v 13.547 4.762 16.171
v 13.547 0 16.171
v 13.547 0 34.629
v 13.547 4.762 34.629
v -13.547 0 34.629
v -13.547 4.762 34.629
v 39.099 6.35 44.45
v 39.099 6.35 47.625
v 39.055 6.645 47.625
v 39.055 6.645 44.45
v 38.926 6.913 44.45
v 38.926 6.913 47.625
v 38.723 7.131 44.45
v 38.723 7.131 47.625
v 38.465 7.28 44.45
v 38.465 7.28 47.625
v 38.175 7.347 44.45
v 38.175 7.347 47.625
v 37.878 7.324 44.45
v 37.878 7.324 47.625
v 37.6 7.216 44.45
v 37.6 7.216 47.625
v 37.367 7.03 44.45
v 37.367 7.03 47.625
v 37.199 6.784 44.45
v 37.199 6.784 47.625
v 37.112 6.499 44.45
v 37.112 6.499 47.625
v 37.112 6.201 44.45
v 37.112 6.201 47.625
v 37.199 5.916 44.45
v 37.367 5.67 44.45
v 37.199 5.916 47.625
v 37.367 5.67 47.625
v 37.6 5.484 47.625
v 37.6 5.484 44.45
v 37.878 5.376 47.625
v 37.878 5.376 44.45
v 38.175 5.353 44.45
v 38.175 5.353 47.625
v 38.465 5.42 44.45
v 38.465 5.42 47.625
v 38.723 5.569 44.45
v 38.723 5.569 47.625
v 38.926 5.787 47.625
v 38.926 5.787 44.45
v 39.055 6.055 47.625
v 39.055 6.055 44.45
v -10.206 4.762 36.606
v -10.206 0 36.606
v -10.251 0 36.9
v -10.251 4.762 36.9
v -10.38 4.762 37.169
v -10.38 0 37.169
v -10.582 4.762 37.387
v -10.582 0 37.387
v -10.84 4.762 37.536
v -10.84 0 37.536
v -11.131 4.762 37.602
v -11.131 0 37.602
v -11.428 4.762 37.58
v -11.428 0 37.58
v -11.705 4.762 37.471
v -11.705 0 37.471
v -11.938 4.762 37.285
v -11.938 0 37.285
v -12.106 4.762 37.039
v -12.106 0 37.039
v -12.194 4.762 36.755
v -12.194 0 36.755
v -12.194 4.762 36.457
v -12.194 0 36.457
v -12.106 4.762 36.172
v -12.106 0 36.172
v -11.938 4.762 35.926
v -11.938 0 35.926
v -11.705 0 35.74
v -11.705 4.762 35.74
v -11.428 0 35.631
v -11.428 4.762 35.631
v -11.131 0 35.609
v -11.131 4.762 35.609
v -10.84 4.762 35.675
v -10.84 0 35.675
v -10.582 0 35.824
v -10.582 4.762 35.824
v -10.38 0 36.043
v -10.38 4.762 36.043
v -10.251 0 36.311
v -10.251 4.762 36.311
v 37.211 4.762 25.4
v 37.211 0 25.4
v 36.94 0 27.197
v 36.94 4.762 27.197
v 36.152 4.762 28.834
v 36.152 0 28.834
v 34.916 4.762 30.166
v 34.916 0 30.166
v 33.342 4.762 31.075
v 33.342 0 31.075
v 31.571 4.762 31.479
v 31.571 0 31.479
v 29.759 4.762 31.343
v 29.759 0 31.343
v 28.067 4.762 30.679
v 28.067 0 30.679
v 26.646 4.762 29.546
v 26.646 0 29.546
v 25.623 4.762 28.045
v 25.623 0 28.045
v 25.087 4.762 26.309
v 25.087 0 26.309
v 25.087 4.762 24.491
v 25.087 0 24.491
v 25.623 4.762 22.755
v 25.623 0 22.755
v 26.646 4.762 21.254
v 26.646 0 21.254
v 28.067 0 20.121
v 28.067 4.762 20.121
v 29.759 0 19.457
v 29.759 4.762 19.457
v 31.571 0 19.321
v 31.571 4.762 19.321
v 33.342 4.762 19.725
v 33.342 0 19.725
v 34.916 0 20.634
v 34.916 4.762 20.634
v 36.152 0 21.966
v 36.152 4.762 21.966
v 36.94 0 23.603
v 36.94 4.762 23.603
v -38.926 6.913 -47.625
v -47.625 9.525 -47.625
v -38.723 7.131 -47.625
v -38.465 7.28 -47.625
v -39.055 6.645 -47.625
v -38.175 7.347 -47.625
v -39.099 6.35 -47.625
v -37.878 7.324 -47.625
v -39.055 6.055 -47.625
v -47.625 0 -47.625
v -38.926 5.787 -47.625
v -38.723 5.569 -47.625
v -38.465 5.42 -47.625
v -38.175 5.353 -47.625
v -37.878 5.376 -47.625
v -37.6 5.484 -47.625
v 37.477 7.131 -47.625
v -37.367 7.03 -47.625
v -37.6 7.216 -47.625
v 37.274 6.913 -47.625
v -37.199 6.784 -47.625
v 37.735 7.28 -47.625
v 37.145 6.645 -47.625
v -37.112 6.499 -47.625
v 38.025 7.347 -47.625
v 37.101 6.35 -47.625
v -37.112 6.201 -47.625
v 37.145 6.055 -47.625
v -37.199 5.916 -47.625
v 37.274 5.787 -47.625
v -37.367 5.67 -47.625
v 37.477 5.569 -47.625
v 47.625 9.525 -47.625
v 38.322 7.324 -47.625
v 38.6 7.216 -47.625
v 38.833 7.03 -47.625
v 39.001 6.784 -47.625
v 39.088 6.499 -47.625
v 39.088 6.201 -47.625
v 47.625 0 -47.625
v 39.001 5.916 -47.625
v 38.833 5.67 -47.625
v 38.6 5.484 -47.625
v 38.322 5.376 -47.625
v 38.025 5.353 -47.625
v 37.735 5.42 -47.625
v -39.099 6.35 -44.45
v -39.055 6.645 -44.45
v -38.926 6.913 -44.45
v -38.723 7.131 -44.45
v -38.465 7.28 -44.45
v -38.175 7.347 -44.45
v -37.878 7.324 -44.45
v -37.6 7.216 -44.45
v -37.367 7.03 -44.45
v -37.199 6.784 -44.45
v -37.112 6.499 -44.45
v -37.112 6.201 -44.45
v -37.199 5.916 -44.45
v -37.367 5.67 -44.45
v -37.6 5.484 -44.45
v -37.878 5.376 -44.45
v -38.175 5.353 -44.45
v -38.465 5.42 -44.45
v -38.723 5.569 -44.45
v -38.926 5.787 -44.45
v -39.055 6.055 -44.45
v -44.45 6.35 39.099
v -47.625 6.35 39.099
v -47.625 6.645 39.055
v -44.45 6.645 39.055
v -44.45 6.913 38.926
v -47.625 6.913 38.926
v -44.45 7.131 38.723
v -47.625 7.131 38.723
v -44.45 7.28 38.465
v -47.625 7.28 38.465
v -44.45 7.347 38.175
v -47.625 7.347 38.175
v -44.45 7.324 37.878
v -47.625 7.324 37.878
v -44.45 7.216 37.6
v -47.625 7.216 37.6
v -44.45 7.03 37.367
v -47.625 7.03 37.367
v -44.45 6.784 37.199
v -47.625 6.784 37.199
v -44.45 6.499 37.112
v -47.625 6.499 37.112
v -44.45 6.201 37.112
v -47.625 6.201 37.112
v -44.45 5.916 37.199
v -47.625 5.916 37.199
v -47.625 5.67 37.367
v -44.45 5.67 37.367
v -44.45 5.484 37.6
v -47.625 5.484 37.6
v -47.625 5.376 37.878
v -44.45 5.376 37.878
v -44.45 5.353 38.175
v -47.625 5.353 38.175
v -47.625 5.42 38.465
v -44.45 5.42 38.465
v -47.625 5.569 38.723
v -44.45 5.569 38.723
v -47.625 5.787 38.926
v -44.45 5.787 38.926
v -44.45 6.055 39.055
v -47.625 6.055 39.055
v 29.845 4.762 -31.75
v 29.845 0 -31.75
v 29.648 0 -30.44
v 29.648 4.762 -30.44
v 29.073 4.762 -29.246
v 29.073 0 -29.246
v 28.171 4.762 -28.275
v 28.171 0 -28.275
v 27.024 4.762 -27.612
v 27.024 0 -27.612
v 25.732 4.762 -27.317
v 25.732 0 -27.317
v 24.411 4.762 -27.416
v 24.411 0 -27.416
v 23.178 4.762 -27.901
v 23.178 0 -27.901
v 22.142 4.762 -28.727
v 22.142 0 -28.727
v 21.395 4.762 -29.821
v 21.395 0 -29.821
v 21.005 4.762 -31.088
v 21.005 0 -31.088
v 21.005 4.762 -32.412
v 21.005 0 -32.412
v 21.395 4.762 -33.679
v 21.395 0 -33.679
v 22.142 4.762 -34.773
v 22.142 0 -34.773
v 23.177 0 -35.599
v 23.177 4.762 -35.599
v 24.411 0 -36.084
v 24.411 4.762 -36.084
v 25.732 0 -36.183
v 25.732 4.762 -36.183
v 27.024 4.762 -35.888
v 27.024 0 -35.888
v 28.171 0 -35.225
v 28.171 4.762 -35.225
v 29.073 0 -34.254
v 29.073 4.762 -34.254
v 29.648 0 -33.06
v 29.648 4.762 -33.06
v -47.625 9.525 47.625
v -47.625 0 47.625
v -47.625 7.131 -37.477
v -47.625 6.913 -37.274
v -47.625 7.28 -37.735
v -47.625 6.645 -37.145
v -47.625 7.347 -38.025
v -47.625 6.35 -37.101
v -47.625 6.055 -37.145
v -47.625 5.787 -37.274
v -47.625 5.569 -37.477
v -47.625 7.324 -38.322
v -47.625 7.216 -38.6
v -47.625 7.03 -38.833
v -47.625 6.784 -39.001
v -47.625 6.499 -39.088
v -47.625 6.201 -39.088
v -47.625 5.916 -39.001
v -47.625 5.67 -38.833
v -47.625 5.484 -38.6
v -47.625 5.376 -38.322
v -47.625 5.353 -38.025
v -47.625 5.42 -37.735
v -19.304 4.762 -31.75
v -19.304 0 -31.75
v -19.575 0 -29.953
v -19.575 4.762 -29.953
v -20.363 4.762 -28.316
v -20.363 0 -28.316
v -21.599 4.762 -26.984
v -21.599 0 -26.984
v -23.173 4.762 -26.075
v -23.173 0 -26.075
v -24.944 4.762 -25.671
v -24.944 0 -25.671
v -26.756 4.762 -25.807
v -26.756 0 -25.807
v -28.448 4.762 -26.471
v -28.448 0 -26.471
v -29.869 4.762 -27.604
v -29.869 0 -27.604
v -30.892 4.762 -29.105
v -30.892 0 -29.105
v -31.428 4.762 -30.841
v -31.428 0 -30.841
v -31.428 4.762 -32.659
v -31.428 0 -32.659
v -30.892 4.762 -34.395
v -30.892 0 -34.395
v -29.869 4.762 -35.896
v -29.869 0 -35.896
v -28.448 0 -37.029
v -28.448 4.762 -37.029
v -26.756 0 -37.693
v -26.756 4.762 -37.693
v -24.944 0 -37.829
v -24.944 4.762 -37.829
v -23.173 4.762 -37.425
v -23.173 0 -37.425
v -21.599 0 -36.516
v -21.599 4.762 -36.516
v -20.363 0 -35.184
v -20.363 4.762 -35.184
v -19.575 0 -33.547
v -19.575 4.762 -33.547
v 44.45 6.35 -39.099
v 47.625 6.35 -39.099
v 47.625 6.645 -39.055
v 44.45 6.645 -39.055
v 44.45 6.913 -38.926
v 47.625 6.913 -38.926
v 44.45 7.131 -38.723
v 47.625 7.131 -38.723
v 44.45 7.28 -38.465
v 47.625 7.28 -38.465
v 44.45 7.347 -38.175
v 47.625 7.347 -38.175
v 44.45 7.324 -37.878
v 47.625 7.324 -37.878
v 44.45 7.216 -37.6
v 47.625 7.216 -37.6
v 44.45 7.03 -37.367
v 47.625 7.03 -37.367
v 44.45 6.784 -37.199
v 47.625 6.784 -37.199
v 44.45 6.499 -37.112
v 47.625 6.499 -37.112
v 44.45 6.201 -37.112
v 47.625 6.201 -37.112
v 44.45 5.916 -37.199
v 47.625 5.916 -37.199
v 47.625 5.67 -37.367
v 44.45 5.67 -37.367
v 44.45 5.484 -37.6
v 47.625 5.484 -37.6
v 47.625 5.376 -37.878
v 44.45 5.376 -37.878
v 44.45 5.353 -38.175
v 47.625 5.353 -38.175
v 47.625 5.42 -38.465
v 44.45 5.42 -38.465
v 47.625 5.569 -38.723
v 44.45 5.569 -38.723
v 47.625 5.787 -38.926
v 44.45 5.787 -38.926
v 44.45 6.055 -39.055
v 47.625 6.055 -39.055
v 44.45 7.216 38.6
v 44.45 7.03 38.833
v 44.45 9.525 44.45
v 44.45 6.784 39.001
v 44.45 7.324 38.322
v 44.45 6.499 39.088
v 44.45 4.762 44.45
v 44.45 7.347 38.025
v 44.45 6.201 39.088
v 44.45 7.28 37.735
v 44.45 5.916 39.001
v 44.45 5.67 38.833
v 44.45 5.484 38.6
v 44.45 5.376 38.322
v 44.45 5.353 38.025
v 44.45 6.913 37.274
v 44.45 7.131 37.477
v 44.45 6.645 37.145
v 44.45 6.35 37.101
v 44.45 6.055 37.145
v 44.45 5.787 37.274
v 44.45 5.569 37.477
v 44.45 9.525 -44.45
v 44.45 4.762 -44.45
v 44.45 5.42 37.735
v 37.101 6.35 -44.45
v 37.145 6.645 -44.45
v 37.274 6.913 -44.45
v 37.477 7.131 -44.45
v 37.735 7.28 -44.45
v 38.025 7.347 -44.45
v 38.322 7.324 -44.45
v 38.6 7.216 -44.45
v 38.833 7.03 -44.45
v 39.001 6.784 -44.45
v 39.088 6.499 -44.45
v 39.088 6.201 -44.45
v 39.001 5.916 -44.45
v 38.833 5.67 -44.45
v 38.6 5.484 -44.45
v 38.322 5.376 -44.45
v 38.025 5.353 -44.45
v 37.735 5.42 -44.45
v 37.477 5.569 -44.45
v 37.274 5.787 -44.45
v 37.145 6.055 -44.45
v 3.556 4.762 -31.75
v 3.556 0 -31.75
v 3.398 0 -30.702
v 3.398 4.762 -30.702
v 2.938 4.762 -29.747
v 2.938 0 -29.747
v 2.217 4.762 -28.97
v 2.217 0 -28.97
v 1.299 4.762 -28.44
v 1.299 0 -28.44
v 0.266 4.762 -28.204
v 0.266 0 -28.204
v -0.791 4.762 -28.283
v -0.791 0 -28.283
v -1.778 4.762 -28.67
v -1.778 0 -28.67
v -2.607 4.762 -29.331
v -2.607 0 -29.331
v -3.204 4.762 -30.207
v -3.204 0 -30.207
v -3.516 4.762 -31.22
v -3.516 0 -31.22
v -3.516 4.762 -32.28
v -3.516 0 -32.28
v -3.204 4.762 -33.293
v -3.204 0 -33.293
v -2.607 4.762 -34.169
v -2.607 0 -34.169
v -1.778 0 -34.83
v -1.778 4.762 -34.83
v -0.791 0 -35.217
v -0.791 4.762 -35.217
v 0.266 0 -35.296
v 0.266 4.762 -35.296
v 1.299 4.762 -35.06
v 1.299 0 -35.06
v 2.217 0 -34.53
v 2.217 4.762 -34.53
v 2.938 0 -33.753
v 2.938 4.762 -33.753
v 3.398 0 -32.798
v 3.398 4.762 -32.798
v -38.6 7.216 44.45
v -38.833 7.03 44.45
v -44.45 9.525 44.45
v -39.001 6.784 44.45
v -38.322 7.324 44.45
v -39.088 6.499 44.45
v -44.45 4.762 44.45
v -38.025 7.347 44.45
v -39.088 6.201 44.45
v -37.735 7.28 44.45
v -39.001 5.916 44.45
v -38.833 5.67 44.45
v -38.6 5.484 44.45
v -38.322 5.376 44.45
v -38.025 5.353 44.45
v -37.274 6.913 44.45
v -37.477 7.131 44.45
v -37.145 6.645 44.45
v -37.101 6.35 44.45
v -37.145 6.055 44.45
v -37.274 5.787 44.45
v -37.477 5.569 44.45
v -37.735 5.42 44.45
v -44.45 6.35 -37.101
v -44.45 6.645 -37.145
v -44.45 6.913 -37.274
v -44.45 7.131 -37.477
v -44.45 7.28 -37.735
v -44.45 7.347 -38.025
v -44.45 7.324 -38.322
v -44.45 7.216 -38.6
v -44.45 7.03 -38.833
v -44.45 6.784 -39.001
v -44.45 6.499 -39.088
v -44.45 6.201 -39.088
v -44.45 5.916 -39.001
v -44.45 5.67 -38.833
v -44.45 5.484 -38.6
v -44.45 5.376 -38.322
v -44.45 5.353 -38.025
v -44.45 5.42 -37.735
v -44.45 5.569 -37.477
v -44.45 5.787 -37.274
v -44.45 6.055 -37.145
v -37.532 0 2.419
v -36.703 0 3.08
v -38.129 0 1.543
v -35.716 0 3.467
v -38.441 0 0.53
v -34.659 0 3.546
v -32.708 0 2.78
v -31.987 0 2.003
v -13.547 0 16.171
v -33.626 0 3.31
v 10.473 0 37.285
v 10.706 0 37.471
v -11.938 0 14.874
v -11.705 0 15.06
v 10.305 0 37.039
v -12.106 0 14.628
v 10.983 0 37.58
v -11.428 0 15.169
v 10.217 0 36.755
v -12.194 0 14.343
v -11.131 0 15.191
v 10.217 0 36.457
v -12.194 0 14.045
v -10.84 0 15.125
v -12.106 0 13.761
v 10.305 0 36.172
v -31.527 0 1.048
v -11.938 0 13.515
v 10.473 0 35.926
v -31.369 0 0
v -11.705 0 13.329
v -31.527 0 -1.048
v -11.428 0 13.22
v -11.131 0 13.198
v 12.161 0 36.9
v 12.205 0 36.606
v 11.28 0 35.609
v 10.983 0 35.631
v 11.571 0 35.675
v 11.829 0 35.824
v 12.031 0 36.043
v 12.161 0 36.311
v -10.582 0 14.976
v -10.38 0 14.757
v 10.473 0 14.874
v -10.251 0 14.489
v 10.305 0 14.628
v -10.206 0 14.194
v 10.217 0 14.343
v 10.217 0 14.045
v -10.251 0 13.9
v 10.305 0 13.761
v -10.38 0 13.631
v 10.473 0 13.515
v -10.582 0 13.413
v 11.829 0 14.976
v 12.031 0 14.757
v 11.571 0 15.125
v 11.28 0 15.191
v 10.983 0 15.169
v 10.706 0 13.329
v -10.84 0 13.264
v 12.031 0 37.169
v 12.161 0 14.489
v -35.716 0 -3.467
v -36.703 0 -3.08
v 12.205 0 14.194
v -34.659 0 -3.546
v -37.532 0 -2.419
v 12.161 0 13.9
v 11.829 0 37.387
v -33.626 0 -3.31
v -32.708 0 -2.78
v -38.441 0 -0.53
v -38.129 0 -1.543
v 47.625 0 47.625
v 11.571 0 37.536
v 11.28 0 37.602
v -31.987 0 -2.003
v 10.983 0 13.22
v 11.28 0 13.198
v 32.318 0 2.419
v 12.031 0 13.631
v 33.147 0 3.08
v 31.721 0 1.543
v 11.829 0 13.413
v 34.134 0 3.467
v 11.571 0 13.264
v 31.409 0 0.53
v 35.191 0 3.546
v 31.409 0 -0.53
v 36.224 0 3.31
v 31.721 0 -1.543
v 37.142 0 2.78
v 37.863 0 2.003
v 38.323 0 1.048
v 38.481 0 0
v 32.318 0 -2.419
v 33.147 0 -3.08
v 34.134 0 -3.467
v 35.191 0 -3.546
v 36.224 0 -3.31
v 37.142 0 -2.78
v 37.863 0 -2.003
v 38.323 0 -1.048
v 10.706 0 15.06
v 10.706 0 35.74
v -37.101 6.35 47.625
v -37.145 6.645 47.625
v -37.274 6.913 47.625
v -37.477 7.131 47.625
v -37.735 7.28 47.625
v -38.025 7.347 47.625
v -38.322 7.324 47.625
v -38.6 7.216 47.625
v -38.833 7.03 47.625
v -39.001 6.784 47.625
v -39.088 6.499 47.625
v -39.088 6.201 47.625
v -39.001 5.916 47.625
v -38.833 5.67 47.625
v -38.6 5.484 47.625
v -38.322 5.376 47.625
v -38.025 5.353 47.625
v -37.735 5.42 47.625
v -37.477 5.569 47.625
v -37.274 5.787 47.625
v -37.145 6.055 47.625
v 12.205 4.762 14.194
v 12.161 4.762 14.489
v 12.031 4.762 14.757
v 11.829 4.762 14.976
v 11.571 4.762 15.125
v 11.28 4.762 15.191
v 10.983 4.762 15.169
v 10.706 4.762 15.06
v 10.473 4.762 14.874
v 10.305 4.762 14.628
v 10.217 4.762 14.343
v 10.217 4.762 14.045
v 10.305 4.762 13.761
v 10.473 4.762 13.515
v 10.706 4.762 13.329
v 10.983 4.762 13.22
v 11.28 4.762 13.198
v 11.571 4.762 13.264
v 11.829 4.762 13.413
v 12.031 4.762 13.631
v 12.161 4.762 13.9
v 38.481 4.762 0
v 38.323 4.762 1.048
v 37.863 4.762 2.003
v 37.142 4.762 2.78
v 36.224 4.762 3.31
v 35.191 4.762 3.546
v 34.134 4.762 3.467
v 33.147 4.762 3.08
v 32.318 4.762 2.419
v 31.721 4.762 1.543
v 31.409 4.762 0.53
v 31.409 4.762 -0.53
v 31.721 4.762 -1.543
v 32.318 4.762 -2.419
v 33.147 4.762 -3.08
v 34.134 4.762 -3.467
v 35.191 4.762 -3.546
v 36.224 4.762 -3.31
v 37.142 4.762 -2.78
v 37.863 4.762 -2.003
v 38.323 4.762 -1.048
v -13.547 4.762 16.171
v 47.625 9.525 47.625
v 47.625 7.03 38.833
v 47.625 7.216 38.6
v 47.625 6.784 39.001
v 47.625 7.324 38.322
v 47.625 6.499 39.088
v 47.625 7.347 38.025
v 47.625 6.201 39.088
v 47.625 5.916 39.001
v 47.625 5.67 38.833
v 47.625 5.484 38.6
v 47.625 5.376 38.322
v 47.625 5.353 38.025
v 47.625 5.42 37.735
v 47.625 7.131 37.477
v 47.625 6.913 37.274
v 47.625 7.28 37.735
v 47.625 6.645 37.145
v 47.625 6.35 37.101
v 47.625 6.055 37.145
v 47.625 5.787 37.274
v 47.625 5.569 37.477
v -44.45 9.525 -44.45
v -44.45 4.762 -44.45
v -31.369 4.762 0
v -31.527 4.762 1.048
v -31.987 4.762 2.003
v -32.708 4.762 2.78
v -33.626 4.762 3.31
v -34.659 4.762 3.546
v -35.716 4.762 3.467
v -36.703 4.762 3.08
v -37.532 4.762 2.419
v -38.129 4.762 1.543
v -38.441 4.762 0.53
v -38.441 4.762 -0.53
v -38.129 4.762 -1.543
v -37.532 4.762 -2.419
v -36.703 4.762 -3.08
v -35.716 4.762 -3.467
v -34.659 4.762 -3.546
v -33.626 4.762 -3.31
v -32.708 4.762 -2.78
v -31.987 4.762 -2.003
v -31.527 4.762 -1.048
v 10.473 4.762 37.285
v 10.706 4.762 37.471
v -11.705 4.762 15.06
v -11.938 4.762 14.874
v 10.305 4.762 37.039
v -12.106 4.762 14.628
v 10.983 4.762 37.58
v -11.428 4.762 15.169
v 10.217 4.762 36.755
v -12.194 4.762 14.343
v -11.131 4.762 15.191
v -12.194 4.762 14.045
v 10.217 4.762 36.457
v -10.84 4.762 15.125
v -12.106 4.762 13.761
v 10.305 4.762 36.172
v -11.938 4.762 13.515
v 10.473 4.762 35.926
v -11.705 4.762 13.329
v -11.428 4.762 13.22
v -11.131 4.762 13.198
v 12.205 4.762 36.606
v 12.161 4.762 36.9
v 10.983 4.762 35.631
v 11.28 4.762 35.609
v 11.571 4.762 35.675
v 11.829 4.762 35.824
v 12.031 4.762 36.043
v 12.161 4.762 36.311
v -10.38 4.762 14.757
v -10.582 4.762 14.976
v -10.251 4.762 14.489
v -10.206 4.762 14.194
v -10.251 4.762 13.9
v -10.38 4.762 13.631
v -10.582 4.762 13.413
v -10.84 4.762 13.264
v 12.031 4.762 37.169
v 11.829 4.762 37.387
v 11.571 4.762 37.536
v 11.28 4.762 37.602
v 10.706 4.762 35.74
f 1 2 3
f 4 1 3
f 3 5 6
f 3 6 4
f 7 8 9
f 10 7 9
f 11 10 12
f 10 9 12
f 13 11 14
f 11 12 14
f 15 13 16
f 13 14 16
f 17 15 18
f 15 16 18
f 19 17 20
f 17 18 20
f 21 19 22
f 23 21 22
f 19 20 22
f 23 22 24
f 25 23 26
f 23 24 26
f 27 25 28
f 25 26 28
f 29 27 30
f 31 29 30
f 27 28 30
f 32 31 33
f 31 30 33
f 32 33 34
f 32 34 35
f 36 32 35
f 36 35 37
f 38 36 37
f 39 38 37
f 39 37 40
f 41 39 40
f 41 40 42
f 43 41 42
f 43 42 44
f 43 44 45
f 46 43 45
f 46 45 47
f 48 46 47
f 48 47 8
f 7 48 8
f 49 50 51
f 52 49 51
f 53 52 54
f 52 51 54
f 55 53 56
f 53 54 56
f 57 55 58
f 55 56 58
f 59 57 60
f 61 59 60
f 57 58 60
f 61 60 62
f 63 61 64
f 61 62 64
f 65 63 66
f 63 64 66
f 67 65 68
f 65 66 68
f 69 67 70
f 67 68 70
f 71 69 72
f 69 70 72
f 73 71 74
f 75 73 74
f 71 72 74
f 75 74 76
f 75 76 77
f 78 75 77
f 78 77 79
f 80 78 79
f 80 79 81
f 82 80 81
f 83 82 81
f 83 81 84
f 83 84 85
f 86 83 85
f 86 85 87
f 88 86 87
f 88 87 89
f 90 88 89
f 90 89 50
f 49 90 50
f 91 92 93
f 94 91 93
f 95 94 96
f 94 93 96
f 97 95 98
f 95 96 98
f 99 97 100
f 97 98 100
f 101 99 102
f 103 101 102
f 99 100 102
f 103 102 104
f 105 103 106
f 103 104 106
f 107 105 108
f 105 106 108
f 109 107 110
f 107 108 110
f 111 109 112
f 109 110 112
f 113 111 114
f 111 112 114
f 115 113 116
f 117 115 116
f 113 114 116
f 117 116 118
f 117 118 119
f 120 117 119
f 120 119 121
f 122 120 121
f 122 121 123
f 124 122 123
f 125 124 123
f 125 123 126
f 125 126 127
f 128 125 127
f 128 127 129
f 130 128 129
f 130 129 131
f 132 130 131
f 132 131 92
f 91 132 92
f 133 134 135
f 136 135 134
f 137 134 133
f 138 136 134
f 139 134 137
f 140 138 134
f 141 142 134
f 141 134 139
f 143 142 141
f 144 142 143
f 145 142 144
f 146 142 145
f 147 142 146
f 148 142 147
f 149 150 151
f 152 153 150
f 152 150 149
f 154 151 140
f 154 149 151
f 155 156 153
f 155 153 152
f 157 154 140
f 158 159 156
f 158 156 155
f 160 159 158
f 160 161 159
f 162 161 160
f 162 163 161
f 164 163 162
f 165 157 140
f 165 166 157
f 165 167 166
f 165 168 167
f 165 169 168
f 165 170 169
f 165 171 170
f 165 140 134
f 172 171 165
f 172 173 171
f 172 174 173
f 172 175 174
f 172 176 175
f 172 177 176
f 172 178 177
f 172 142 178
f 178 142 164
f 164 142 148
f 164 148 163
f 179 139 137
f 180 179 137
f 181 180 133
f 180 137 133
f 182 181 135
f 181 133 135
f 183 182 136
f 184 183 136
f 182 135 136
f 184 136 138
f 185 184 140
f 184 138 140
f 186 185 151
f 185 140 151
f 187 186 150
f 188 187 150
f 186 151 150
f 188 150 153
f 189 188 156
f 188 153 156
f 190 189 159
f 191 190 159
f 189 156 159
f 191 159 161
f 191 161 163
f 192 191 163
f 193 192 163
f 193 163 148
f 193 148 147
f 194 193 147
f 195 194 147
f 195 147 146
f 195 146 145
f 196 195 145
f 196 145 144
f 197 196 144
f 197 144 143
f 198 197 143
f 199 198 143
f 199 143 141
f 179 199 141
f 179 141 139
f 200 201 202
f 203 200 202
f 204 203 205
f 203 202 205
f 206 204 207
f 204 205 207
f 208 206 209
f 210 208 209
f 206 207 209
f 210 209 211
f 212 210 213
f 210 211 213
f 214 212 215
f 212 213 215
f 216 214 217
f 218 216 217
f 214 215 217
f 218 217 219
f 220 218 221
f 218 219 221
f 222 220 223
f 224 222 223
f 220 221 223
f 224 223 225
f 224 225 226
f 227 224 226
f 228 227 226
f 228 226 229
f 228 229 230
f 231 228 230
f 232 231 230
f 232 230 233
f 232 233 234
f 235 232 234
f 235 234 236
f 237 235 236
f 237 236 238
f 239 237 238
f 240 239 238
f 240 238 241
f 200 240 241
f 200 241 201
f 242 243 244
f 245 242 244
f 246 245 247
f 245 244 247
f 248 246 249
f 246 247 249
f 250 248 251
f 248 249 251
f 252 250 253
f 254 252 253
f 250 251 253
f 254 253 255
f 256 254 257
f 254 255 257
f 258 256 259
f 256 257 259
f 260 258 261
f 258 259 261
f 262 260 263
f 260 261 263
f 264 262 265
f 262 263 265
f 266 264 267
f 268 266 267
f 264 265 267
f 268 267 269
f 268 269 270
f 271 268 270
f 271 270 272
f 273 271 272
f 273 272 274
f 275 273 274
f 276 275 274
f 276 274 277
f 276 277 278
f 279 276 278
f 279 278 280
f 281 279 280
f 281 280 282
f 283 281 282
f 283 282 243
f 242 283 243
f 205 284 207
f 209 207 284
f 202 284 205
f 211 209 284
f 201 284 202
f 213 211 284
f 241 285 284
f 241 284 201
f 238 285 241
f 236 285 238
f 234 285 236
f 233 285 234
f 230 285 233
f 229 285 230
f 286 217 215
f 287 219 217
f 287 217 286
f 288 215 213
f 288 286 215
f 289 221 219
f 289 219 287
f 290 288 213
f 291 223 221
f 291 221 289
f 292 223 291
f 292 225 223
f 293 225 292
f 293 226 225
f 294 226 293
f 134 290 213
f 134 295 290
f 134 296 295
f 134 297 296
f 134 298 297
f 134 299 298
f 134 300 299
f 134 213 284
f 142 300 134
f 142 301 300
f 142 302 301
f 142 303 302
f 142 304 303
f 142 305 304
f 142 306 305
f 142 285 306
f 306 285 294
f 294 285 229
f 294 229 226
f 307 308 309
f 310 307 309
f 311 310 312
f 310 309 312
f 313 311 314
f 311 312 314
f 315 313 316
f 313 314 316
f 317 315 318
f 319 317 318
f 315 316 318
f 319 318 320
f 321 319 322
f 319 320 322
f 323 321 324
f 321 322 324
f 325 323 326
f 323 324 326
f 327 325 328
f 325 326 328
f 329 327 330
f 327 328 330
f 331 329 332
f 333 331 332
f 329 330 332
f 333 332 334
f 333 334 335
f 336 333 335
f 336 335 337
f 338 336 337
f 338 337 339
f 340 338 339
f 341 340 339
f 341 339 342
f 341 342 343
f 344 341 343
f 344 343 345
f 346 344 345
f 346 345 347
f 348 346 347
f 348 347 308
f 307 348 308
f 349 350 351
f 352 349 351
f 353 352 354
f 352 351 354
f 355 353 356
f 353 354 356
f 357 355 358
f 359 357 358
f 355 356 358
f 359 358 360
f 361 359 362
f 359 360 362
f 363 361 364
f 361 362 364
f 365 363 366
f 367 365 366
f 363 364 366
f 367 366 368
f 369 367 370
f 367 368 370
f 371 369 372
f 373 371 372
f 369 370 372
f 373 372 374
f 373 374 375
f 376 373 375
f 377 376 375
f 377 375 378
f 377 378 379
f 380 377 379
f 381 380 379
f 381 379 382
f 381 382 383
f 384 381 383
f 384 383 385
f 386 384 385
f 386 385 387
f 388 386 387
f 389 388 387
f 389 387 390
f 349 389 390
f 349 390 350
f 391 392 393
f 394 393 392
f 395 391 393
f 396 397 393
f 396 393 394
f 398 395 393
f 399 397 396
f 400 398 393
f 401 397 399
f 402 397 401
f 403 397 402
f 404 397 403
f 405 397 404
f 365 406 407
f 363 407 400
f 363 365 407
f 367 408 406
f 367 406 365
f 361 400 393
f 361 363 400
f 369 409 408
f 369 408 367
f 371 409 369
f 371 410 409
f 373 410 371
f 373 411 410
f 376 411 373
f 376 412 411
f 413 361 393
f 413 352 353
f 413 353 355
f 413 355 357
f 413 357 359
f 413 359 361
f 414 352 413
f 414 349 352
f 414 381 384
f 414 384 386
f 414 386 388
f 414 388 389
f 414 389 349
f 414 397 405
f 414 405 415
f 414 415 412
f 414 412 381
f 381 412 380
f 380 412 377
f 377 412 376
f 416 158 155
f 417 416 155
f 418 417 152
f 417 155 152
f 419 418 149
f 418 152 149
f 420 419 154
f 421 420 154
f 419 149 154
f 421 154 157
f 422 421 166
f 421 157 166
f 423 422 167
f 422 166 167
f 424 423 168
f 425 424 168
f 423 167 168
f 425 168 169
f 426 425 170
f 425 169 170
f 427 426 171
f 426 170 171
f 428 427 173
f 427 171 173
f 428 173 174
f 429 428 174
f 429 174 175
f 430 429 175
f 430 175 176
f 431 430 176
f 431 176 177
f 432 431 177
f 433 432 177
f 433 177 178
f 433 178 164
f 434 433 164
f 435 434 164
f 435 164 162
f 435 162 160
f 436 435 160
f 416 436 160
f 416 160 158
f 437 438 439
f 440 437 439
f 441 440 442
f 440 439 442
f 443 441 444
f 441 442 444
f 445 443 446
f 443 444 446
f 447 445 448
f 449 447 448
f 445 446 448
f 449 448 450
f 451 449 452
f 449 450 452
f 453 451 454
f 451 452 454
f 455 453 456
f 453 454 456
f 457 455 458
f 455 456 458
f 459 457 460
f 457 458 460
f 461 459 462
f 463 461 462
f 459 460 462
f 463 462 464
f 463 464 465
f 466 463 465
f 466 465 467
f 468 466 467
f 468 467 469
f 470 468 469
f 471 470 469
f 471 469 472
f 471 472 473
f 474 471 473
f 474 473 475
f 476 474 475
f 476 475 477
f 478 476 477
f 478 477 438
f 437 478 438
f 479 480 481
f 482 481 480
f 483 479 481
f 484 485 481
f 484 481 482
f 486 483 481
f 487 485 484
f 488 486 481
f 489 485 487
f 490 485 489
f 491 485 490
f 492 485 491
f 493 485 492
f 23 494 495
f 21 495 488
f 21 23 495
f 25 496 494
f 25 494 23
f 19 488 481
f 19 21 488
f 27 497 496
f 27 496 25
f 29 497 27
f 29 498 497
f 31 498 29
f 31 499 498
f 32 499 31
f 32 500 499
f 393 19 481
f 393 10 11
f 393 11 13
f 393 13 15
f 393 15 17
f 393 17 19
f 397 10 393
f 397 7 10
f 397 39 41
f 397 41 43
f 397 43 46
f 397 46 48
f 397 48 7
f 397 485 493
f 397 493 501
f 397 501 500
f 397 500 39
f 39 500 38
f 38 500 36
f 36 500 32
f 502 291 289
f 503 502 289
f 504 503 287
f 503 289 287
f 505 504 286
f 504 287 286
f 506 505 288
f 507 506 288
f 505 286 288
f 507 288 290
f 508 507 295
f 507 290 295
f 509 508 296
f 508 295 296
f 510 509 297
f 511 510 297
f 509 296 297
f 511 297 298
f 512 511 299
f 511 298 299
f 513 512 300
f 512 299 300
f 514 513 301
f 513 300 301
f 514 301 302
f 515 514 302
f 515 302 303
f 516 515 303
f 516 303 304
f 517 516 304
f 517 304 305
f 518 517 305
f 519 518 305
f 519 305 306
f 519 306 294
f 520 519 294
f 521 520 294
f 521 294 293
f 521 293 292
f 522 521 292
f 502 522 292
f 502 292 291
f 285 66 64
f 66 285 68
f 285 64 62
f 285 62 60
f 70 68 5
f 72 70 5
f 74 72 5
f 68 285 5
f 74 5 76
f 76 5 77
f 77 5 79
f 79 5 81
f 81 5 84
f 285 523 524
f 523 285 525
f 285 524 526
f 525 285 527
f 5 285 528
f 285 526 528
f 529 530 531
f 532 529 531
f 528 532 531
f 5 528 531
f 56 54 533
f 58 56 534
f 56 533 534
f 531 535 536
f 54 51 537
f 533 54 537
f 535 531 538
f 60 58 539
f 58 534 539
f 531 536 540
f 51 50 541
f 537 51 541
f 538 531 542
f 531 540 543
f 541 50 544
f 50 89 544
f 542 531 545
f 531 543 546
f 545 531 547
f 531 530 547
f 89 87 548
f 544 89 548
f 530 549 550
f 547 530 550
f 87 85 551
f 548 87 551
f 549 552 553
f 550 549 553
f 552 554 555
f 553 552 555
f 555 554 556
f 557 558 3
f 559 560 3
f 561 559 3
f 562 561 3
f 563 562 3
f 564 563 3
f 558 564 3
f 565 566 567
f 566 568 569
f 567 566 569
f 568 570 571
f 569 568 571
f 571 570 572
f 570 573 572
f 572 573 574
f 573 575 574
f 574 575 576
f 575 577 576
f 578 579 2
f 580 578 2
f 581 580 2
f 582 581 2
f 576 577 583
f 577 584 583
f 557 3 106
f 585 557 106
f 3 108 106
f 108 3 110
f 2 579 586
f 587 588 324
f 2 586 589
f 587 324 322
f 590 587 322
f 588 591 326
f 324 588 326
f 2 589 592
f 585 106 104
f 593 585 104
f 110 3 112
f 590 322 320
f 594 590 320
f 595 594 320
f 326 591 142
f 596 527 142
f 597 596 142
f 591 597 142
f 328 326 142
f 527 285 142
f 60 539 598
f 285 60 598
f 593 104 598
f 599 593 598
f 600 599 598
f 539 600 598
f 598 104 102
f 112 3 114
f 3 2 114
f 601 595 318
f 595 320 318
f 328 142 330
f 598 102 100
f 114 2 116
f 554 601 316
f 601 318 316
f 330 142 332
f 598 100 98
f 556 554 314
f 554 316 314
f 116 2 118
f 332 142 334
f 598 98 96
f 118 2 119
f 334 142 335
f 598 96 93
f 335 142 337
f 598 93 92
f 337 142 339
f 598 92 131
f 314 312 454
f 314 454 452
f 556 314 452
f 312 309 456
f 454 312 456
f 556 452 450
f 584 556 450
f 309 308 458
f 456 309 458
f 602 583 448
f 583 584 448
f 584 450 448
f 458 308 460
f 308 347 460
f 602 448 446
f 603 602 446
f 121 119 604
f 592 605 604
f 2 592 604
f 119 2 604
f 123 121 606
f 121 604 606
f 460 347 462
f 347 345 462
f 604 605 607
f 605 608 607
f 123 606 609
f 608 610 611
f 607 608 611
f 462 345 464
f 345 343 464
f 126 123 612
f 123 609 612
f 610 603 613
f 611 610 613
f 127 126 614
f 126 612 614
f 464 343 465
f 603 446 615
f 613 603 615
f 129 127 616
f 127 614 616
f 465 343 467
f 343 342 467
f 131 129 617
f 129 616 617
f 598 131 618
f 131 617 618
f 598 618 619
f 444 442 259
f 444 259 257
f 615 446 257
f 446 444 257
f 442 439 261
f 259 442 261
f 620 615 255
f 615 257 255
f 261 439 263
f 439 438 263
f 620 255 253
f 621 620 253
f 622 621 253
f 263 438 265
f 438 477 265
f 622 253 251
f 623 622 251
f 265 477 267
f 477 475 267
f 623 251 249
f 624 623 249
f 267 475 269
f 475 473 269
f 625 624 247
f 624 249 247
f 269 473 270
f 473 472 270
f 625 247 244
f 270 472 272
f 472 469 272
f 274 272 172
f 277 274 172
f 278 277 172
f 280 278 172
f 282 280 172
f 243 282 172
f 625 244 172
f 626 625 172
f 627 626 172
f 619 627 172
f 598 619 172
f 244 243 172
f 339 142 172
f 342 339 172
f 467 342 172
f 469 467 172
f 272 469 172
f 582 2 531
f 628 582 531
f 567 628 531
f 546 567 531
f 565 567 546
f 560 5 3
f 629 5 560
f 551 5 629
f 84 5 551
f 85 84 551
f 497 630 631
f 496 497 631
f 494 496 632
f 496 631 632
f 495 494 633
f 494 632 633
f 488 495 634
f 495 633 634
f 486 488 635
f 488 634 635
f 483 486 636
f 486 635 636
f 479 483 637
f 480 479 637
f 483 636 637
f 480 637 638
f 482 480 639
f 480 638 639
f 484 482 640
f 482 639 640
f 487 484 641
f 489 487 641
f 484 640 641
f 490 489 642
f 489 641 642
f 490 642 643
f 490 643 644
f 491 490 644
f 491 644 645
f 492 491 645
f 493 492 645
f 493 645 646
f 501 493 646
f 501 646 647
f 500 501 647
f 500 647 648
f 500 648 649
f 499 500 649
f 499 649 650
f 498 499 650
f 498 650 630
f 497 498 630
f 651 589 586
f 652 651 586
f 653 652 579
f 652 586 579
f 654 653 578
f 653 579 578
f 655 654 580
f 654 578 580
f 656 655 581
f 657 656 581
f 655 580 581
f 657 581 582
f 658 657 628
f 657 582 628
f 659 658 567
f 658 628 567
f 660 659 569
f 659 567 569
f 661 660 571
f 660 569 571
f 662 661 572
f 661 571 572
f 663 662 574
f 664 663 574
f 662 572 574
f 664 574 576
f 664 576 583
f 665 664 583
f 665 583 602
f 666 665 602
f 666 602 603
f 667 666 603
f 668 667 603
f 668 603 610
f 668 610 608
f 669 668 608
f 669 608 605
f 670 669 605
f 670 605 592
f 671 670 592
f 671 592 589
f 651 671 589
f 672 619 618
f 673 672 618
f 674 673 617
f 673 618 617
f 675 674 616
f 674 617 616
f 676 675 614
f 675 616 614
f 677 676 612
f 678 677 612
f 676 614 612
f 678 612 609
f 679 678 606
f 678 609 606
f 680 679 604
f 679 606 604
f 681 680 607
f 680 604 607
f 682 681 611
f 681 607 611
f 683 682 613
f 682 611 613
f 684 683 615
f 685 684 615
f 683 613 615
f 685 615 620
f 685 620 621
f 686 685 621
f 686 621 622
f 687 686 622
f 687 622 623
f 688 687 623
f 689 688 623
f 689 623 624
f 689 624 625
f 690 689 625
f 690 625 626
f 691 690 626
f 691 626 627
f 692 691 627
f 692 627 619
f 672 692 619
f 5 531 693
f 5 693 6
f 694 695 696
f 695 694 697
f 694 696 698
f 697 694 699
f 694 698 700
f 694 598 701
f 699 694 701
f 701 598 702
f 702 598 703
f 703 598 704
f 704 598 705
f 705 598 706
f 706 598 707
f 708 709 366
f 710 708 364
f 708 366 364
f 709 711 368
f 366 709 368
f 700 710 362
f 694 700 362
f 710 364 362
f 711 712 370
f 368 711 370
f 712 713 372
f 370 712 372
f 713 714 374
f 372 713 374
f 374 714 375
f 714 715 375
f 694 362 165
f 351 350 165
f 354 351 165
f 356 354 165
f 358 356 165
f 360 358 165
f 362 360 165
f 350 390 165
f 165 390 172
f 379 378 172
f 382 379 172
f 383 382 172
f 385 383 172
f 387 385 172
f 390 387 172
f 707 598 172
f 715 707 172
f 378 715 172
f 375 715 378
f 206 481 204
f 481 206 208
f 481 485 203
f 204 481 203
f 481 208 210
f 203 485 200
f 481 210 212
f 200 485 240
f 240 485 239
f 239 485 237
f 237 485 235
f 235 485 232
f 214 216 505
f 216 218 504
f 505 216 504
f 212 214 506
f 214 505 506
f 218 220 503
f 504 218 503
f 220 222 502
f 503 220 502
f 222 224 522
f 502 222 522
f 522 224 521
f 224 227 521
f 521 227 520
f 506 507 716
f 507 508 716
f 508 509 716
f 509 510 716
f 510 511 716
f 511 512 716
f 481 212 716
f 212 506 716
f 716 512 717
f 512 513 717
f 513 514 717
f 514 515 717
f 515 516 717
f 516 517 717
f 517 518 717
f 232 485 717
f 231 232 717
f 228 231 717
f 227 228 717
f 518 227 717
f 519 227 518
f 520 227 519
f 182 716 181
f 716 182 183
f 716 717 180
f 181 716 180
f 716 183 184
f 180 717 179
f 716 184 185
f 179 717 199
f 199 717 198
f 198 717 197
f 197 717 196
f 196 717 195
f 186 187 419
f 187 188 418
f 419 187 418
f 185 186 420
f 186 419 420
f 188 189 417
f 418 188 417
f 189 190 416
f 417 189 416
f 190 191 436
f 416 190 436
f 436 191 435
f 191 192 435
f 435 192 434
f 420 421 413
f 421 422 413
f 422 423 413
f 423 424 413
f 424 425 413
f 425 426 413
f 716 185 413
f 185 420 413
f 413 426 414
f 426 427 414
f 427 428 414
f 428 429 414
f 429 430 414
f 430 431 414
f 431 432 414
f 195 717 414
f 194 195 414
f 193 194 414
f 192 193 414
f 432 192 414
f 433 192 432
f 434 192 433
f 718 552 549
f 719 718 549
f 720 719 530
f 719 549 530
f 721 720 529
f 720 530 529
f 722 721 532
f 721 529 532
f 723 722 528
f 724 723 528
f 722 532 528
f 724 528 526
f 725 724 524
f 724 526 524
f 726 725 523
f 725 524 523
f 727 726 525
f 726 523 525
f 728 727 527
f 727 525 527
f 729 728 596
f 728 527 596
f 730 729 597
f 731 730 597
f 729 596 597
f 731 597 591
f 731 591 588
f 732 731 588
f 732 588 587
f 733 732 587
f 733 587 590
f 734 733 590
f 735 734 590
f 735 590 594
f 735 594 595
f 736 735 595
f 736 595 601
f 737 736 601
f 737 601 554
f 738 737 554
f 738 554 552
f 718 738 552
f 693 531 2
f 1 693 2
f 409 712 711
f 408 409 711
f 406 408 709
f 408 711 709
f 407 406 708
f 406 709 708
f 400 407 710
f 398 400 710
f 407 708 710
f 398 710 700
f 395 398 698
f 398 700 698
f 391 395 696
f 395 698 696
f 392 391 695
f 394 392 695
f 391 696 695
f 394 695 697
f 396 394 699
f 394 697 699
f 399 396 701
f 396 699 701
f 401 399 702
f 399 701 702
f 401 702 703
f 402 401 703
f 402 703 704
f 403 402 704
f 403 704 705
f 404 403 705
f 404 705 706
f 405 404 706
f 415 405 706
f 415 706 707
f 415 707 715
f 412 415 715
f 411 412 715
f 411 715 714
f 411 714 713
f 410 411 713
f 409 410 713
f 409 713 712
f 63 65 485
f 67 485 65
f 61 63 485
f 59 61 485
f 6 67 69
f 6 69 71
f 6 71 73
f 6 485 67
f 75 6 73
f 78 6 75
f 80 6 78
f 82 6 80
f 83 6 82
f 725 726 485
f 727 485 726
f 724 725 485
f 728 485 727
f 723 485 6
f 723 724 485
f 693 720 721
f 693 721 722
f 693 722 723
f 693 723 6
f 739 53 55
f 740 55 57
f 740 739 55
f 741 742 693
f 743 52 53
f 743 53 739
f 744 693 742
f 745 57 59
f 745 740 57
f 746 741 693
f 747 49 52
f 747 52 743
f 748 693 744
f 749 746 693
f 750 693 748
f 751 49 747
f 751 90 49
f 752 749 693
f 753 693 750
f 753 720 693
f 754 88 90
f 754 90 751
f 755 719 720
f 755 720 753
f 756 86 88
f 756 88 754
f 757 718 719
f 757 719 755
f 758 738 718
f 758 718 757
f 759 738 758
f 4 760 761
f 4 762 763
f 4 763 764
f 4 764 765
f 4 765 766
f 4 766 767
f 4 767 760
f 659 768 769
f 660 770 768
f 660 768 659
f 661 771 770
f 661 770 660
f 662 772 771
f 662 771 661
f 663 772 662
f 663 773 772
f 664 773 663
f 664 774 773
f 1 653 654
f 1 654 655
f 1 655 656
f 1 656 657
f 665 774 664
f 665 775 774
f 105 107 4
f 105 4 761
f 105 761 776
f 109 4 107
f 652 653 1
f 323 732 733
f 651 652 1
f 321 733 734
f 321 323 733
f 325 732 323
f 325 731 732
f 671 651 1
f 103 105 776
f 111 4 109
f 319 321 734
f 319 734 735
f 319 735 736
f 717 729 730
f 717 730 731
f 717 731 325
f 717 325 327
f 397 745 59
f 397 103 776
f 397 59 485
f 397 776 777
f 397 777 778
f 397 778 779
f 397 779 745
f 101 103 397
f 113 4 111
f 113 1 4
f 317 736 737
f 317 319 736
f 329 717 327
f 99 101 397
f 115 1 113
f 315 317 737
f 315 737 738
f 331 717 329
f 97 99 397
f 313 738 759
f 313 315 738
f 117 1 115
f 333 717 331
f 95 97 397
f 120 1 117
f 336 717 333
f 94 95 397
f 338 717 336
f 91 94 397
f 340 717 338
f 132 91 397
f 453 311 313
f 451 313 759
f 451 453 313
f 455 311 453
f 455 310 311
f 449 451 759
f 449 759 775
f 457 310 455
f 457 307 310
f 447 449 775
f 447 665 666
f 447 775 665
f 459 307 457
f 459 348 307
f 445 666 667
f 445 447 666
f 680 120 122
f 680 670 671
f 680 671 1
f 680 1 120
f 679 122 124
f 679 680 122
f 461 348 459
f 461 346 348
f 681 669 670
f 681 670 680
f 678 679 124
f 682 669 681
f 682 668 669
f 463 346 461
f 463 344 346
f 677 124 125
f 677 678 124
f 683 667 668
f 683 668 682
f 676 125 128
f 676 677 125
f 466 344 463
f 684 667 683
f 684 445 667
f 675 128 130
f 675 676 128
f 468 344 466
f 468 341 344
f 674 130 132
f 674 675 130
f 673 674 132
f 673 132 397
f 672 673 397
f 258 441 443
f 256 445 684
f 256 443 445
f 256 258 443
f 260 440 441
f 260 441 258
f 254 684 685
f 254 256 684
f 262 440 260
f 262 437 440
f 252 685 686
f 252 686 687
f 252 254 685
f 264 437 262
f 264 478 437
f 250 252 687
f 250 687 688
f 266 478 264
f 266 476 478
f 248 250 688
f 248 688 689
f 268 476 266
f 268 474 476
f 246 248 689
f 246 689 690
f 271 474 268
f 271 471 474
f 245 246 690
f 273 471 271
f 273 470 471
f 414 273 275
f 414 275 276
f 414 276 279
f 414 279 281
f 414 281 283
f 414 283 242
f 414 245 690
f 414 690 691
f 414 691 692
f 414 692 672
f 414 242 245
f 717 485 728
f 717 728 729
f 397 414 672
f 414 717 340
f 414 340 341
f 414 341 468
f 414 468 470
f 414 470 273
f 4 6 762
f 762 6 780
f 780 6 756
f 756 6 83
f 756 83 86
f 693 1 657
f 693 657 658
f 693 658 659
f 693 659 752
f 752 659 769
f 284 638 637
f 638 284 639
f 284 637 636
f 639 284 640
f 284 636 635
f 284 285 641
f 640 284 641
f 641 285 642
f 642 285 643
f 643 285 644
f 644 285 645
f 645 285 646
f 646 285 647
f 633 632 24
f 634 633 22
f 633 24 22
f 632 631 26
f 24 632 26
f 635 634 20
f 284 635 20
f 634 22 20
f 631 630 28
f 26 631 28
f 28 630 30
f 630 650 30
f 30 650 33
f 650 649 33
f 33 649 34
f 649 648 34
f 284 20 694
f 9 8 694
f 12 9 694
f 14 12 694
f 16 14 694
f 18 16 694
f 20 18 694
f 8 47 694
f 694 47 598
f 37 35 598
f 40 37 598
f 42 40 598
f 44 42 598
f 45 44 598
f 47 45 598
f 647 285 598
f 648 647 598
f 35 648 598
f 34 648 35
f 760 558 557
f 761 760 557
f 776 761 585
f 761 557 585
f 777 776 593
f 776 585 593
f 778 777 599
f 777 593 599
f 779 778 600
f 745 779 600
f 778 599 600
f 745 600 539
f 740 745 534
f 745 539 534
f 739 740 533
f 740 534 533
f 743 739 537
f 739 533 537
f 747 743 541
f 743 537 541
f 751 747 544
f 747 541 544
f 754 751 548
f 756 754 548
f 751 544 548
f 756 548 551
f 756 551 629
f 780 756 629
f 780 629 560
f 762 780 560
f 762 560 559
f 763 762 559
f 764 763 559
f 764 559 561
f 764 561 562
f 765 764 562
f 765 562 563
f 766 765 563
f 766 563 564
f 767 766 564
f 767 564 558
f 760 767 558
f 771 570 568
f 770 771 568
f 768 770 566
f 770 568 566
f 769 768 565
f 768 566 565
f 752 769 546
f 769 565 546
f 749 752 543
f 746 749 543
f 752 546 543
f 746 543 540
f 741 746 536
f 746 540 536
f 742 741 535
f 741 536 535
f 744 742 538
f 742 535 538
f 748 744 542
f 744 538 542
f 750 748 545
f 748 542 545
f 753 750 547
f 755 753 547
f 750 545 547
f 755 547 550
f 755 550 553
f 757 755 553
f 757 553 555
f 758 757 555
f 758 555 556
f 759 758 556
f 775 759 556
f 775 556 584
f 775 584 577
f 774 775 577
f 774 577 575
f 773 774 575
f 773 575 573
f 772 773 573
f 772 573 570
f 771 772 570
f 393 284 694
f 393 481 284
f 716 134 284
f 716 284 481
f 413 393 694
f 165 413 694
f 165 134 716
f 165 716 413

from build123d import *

# Parameters (mm, degrees)
SKETCH1_W           = 101.6
SKETCH1_H           = 101.6
BOSS_EXTRUDE1_DEPTH = 3.175
SKETCH2_W           = 101.6
SKETCH2_H           = 101.6
SKETCH2_W_2         = 88.9
SKETCH2_H_2         = 88.9
BOSS_EXTRUDE2_DEPTH = 6.35
SKETCH3_R           = 0.99949
CUT_EXTRUDE1_DEPTH  = 6.35
CIRPATTERN1_COUNT   = 4
SKETCH8_W           = 88.9
SKETCH8_H           = 88.9
BOSS_EXTRUDE3_DEPTH = 1.5875
SKETCH4_W           = 101.6
SKETCH4_H           = 101.6
SKETCH4_W_2         = 95.25
SKETCH4_H_2         = 95.25
CUT_EXTRUDE2_DEPTH  = 10.525
SKETCH6_R           = 3.556
SKETCH6_R_2         = 6.096
SKETCH6_R_3         = 4.445
INPUTS_DEPTH        = 10.525
SKETCH5_R           = 0.99949
SKETCH5_W           = 27.093418
SKETCH5_H           = 18.457418
SCREEN_DEPTH        = 10.525
SKETCH7_R           = 3.556
CUT_EXTRUDE5_DEPTH  = 10.525


with BuildPart() as part:
    # Sketch1 → Boss-Extrude1 (new body)
    with BuildSketch(Plane(origin=(0, 0, 0), x_dir=(1, 0, 0), z_dir=(0, 1, 0))):
        Rectangle(SKETCH1_W, SKETCH1_H)
    extrude(amount=BOSS_EXTRUDE1_DEPTH)

    # Sketch2 → Boss-Extrude2 (add)
    with BuildSketch(Plane(origin=(0, 3.175, 0), x_dir=(1, 0, 0), z_dir=(0, 1, 0))):
        Rectangle(SKETCH2_W, SKETCH2_H)
        Rectangle(SKETCH2_W_2, SKETCH2_H_2, mode=Mode.SUBTRACT)
    extrude(amount=BOSS_EXTRUDE2_DEPTH)

    # Sketch3 → Cut-Extrude1 (cut)
    with BuildSketch(Plane.XY.offset(50.8)):
        with Locations((-38.1, 6.35)):
            Circle(SKETCH3_R)
        with Locations((38.1, 6.35)):
            Circle(SKETCH3_R)
    cut_extrude1 = extrude(amount=-CUT_EXTRUDE1_DEPTH, mode=Mode.SUBTRACT)

    # CirPattern1: Cut-Extrude1 ×4 about axis
    cirpattern1_axis = Axis((0, 10.00125, 0), (0, -1, 0))
    for i in range(1, CIRPATTERN1_COUNT):
        add(cut_extrude1.rotate(cirpattern1_axis, i * 360 / CIRPATTERN1_COUNT), mode=Mode.SUBTRACT)

    # Sketch8 → Boss-Extrude3 (add)
    with BuildSketch(Plane(origin=(0, 3.175, 0), x_dir=(1, 0, 0), z_dir=(0, 1, 0))):
        Rectangle(SKETCH8_W, SKETCH8_H)
    extrude(amount=BOSS_EXTRUDE3_DEPTH)

    # Sketch4 → Cut-Extrude2 (cut, through all)
    with BuildSketch(Plane(origin=(0, 0, 0), x_dir=(1, 0, 0), z_dir=(0, 1, 0))):
        Rectangle(SKETCH4_W, SKETCH4_H)
        Rectangle(SKETCH4_W_2, SKETCH4_H_2, mode=Mode.SUBTRACT)
    extrude(amount=CUT_EXTRUDE2_DEPTH, mode=Mode.SUBTRACT)

    # Sketch6 → Inputs (cut, through all)
    with BuildSketch(Plane.XZ):
        with Locations((0, -31.75)):
            Circle(SKETCH6_R)
        with Locations((-25.4, -31.75)):
            Circle(SKETCH6_R_2)
        with Locations((25.4, -31.75)):
            Circle(SKETCH6_R_3)
        with Locations((31.115, 25.4)):
            Circle(SKETCH6_R_2)
    extrude(amount=-INPUTS_DEPTH, mode=Mode.SUBTRACT)

    # Sketch5 → Screen (cut, through all)
    with BuildSketch(Plane.XZ):
        with Locations((-11.205633292, 14.194366708)):
            Circle(SKETCH5_R)
        with Locations((11.205633292, 14.194366708)):
            Circle(SKETCH5_R)
        with Locations((11.205633292, 36.605633292)):
            Circle(SKETCH5_R)
        with Locations((-11.205633292, 36.605633292)):
            Circle(SKETCH5_R)
        with Locations((0, 25.4)):
            Rectangle(SKETCH5_W, SKETCH5_H)
    extrude(amount=-SCREEN_DEPTH, mode=Mode.SUBTRACT)

    # Sketch7 → Cut-Extrude5 (cut, through all)
    with BuildSketch(Plane.XZ):
        with Locations((-34.925, 0)):
            Circle(SKETCH7_R)
        with Locations((34.925, 0)):
            Circle(SKETCH7_R)
    extrude(amount=-CUT_EXTRUDE5_DEPTH, mode=Mode.SUBTRACT)


solid = part.part
